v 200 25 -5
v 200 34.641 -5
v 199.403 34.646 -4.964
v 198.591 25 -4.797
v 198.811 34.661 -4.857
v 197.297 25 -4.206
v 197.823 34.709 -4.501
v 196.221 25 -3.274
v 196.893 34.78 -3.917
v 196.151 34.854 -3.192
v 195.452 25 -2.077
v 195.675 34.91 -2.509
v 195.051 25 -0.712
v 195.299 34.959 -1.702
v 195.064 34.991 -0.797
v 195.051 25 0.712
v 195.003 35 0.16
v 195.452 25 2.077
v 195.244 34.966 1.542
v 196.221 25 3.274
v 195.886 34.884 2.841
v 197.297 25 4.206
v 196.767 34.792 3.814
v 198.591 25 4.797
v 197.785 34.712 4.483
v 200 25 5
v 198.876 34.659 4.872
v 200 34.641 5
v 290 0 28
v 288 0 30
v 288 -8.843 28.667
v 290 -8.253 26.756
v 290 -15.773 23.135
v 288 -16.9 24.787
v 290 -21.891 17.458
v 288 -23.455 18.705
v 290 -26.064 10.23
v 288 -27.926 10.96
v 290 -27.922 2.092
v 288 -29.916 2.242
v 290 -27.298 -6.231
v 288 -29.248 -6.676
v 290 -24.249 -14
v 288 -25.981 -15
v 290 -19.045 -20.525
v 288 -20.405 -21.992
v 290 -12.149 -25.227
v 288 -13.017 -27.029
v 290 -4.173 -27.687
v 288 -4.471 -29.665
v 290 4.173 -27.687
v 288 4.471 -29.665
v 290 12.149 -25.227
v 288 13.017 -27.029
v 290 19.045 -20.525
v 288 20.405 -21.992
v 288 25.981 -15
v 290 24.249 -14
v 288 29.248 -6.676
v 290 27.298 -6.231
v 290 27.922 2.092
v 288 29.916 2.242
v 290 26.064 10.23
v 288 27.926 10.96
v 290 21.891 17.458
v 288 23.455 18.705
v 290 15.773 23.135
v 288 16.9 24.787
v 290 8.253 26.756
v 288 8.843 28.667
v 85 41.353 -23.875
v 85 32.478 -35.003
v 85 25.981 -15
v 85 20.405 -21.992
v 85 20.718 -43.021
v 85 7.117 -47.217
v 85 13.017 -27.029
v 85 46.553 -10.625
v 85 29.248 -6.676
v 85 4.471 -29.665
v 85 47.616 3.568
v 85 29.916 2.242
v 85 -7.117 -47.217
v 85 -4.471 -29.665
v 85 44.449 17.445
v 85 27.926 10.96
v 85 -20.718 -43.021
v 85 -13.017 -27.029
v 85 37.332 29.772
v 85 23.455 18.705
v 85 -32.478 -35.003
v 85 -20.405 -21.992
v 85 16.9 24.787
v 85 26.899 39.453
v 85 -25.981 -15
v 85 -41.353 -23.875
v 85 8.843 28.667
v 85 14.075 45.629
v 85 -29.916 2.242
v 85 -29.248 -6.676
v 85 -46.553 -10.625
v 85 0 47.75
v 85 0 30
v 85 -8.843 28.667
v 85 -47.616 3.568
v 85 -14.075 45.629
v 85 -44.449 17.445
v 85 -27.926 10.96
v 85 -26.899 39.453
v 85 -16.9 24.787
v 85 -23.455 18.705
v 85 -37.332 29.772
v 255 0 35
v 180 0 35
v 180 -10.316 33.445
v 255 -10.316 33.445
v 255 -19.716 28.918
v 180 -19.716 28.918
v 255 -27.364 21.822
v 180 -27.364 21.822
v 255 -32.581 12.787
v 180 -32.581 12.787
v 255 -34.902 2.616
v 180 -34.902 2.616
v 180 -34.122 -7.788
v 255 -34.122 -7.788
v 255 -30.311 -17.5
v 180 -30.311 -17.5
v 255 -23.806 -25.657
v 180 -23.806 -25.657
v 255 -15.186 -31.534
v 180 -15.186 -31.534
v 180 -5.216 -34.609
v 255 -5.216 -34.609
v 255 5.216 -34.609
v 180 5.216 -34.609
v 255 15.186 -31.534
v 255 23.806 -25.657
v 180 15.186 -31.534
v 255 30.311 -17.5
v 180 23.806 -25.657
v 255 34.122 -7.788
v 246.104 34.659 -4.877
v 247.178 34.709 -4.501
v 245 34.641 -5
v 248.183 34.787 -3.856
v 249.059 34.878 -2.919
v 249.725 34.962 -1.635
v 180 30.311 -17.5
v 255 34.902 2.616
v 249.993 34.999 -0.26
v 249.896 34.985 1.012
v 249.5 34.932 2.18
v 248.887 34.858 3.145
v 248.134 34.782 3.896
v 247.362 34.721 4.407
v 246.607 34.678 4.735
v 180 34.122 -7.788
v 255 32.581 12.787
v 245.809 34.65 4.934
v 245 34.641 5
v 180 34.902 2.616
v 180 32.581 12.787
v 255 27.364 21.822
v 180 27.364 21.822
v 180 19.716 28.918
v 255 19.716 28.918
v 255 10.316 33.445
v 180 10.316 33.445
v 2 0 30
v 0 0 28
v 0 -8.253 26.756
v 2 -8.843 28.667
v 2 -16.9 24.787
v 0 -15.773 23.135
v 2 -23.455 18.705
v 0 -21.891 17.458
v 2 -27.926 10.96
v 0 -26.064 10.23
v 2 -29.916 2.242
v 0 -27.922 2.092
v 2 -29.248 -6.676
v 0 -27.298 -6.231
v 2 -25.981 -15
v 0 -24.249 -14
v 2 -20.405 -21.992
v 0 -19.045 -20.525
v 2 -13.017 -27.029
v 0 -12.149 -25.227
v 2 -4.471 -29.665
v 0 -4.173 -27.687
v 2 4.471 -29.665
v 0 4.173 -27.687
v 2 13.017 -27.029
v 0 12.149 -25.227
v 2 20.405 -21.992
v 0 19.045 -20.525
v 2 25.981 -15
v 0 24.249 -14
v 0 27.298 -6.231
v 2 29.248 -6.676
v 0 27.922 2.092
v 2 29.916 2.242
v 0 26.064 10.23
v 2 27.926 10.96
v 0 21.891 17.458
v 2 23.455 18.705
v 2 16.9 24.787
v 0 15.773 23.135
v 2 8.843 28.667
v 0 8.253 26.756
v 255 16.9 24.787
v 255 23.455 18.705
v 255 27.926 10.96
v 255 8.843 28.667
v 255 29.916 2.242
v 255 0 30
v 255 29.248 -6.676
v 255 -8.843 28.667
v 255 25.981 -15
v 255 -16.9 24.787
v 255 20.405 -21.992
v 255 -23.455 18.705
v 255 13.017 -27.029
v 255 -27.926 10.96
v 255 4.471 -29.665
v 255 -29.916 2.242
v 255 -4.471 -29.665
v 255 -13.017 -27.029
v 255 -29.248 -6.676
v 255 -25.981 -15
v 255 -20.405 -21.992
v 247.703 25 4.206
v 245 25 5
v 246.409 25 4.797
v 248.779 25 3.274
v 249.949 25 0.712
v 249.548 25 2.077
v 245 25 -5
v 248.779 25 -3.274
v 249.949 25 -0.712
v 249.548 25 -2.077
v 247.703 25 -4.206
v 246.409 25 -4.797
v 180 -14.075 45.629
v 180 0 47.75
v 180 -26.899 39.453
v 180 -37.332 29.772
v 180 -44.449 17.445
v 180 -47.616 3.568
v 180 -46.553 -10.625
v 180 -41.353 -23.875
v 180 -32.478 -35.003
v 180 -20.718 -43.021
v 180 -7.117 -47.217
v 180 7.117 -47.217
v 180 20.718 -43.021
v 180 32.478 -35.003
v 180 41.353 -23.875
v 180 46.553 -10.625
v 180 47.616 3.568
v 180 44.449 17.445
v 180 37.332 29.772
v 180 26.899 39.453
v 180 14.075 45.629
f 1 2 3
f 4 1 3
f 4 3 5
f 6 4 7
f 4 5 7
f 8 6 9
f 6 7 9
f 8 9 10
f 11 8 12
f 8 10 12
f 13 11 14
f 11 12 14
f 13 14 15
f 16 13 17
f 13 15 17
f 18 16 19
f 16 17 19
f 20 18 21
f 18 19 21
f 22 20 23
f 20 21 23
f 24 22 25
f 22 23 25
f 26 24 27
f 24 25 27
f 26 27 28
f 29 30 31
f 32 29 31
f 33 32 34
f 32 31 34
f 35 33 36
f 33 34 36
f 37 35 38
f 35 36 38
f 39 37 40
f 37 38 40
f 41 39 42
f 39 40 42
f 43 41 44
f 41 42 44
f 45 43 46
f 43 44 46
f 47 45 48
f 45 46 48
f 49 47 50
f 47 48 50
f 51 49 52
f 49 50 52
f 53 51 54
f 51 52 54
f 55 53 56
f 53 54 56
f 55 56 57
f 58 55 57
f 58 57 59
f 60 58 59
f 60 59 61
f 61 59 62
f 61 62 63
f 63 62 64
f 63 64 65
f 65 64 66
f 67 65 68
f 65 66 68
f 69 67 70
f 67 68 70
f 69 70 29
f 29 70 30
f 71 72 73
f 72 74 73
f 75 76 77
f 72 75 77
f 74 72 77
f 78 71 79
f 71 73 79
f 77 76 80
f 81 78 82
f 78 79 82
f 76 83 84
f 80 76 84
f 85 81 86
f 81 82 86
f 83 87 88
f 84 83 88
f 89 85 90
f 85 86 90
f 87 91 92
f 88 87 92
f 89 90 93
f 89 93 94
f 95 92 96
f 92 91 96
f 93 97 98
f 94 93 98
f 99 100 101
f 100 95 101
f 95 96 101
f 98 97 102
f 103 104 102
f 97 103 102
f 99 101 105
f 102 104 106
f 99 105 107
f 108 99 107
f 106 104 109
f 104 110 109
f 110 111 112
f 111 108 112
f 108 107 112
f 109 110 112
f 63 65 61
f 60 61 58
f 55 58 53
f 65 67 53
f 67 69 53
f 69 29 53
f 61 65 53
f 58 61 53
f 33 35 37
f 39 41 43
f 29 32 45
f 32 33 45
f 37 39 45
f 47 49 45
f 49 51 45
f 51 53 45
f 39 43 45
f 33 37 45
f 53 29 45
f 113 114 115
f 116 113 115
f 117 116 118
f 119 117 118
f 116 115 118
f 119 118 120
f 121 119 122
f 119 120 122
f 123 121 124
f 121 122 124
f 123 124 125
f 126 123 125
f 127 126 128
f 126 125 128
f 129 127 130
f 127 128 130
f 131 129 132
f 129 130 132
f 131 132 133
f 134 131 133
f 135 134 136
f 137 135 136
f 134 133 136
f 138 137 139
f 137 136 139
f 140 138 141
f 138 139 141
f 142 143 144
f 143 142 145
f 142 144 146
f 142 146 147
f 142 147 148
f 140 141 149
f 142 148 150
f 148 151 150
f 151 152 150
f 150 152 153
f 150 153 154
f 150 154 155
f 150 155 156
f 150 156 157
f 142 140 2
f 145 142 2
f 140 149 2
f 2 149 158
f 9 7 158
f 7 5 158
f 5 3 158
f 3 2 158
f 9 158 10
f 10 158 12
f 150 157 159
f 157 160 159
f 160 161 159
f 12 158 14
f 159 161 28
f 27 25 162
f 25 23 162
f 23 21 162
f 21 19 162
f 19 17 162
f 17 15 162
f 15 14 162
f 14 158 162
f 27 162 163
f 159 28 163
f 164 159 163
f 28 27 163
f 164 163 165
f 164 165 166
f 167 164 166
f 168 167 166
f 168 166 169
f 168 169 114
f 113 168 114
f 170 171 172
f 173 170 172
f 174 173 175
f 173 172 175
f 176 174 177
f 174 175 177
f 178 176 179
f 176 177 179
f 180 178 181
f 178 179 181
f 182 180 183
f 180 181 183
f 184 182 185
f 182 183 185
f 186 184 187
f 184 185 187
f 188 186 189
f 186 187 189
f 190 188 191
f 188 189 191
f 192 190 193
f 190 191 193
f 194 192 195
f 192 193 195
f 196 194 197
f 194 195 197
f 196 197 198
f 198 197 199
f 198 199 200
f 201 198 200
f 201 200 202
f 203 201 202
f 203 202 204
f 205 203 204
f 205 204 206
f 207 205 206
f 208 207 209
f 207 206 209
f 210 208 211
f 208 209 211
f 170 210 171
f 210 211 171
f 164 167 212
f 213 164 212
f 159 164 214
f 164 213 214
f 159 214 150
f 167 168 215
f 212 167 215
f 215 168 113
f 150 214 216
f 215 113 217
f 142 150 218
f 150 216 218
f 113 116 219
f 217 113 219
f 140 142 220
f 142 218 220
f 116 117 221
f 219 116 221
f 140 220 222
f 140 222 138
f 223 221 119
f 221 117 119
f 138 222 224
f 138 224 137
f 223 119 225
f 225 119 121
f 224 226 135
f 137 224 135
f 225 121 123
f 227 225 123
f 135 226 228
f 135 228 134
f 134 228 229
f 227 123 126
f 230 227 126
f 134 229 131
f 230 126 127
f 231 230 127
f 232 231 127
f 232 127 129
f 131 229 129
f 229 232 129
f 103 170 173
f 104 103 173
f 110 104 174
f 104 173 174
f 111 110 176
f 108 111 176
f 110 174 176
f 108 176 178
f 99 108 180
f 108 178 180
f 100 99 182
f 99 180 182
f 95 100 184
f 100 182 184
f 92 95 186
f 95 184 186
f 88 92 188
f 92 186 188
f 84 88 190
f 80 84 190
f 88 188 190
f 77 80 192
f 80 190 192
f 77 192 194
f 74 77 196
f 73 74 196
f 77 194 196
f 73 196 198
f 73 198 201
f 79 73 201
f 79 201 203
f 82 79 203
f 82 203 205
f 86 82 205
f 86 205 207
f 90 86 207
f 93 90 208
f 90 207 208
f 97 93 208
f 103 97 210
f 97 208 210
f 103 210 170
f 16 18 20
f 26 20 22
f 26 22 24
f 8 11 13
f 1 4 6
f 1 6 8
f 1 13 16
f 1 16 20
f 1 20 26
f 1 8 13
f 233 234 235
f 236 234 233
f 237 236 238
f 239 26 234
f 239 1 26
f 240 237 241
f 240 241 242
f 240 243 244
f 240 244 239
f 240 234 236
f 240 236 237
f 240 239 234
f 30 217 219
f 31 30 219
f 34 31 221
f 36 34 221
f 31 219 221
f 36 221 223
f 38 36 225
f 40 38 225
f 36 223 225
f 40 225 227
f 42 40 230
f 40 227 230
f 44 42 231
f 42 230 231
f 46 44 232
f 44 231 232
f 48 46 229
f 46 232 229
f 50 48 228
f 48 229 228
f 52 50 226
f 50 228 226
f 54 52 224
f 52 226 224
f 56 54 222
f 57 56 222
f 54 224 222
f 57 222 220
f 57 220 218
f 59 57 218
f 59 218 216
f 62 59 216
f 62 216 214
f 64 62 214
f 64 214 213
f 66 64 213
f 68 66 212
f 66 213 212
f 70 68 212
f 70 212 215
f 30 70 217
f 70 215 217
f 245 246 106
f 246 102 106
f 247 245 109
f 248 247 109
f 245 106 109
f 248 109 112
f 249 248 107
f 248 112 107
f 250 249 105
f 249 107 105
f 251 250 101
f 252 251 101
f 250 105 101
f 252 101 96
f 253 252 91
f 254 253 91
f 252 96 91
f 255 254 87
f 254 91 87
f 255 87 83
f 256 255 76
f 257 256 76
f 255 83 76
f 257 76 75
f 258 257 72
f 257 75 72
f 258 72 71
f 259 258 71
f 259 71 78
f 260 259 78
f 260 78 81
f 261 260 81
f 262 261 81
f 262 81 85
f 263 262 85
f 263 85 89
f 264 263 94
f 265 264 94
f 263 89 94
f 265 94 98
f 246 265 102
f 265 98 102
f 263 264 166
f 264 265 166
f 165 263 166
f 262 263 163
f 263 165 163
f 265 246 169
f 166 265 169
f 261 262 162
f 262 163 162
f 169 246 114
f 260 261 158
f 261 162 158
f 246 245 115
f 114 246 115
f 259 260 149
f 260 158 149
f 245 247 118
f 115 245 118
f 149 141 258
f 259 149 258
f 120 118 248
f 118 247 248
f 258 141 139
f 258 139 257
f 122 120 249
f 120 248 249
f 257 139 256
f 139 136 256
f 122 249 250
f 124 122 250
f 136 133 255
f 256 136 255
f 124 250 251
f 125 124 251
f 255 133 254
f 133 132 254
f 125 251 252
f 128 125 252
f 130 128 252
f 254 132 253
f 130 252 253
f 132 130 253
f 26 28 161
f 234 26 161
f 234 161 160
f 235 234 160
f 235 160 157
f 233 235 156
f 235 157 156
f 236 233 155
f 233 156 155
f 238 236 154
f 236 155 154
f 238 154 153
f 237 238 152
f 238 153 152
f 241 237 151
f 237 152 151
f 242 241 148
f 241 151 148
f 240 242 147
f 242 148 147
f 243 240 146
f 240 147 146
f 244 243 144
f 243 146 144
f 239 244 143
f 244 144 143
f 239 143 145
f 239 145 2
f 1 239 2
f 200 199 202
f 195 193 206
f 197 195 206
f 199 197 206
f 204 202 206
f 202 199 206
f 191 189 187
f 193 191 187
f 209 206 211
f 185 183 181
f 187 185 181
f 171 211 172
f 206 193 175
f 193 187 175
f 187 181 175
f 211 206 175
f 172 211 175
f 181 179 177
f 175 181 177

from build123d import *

# Parameters (mm, degrees)
CHAFL_N1_SIZE         = 2
CORTAR_EXTRUIR1_DEPTH = 10


with BuildPart() as part:
    # Croquis1 → Revolución1 (revolve)
    with BuildSketch(Plane.XY, mode=Mode.PRIVATE) as revoluci_n1_sk:
        Polygon((0, 0), (290, 0), (290, 30), (255, 30), (255, 35), (180, 35), (180, 47.75), (85, 47.75), (85, 30), (0, 30), align=None)
    revolve(revoluci_n1_sk.sketch.rotate(Axis((0, 0, 0), (1, 0, 0)), 90), axis=Axis((0, 0, 0), (1, 0, 0)))

    # Chaflán1
    chafl_n1_edges = [part.edges().sort_by_distance(p)[0] for p in [
        (290, 0, -30),
        (0, 0, -30),
    ]]
    chamfer(chafl_n1_edges, length=CHAFL_N1_SIZE)

    # Croquis2 → Cortar-Extruir1 (cut)
    with BuildSketch(Plane(origin=(30.68575842, 35, 0), x_dir=(1, 0, 0), z_dir=(0, 1, 0))):
        with BuildLine():
            Line((169.31424158, -5), (214.31424158, -5))
            ThreePointArc((214.31424158, -5), (219.31424158, 0), (214.31424158, 5))
            Line((214.31424158, 5), (169.31424158, 5))
            ThreePointArc((169.31424158, 5), (164.31424158, 0), (169.31424158, -5))
        make_face()
    extrude(amount=-CORTAR_EXTRUIR1_DEPTH, mode=Mode.SUBTRACT)


solid = part.part
